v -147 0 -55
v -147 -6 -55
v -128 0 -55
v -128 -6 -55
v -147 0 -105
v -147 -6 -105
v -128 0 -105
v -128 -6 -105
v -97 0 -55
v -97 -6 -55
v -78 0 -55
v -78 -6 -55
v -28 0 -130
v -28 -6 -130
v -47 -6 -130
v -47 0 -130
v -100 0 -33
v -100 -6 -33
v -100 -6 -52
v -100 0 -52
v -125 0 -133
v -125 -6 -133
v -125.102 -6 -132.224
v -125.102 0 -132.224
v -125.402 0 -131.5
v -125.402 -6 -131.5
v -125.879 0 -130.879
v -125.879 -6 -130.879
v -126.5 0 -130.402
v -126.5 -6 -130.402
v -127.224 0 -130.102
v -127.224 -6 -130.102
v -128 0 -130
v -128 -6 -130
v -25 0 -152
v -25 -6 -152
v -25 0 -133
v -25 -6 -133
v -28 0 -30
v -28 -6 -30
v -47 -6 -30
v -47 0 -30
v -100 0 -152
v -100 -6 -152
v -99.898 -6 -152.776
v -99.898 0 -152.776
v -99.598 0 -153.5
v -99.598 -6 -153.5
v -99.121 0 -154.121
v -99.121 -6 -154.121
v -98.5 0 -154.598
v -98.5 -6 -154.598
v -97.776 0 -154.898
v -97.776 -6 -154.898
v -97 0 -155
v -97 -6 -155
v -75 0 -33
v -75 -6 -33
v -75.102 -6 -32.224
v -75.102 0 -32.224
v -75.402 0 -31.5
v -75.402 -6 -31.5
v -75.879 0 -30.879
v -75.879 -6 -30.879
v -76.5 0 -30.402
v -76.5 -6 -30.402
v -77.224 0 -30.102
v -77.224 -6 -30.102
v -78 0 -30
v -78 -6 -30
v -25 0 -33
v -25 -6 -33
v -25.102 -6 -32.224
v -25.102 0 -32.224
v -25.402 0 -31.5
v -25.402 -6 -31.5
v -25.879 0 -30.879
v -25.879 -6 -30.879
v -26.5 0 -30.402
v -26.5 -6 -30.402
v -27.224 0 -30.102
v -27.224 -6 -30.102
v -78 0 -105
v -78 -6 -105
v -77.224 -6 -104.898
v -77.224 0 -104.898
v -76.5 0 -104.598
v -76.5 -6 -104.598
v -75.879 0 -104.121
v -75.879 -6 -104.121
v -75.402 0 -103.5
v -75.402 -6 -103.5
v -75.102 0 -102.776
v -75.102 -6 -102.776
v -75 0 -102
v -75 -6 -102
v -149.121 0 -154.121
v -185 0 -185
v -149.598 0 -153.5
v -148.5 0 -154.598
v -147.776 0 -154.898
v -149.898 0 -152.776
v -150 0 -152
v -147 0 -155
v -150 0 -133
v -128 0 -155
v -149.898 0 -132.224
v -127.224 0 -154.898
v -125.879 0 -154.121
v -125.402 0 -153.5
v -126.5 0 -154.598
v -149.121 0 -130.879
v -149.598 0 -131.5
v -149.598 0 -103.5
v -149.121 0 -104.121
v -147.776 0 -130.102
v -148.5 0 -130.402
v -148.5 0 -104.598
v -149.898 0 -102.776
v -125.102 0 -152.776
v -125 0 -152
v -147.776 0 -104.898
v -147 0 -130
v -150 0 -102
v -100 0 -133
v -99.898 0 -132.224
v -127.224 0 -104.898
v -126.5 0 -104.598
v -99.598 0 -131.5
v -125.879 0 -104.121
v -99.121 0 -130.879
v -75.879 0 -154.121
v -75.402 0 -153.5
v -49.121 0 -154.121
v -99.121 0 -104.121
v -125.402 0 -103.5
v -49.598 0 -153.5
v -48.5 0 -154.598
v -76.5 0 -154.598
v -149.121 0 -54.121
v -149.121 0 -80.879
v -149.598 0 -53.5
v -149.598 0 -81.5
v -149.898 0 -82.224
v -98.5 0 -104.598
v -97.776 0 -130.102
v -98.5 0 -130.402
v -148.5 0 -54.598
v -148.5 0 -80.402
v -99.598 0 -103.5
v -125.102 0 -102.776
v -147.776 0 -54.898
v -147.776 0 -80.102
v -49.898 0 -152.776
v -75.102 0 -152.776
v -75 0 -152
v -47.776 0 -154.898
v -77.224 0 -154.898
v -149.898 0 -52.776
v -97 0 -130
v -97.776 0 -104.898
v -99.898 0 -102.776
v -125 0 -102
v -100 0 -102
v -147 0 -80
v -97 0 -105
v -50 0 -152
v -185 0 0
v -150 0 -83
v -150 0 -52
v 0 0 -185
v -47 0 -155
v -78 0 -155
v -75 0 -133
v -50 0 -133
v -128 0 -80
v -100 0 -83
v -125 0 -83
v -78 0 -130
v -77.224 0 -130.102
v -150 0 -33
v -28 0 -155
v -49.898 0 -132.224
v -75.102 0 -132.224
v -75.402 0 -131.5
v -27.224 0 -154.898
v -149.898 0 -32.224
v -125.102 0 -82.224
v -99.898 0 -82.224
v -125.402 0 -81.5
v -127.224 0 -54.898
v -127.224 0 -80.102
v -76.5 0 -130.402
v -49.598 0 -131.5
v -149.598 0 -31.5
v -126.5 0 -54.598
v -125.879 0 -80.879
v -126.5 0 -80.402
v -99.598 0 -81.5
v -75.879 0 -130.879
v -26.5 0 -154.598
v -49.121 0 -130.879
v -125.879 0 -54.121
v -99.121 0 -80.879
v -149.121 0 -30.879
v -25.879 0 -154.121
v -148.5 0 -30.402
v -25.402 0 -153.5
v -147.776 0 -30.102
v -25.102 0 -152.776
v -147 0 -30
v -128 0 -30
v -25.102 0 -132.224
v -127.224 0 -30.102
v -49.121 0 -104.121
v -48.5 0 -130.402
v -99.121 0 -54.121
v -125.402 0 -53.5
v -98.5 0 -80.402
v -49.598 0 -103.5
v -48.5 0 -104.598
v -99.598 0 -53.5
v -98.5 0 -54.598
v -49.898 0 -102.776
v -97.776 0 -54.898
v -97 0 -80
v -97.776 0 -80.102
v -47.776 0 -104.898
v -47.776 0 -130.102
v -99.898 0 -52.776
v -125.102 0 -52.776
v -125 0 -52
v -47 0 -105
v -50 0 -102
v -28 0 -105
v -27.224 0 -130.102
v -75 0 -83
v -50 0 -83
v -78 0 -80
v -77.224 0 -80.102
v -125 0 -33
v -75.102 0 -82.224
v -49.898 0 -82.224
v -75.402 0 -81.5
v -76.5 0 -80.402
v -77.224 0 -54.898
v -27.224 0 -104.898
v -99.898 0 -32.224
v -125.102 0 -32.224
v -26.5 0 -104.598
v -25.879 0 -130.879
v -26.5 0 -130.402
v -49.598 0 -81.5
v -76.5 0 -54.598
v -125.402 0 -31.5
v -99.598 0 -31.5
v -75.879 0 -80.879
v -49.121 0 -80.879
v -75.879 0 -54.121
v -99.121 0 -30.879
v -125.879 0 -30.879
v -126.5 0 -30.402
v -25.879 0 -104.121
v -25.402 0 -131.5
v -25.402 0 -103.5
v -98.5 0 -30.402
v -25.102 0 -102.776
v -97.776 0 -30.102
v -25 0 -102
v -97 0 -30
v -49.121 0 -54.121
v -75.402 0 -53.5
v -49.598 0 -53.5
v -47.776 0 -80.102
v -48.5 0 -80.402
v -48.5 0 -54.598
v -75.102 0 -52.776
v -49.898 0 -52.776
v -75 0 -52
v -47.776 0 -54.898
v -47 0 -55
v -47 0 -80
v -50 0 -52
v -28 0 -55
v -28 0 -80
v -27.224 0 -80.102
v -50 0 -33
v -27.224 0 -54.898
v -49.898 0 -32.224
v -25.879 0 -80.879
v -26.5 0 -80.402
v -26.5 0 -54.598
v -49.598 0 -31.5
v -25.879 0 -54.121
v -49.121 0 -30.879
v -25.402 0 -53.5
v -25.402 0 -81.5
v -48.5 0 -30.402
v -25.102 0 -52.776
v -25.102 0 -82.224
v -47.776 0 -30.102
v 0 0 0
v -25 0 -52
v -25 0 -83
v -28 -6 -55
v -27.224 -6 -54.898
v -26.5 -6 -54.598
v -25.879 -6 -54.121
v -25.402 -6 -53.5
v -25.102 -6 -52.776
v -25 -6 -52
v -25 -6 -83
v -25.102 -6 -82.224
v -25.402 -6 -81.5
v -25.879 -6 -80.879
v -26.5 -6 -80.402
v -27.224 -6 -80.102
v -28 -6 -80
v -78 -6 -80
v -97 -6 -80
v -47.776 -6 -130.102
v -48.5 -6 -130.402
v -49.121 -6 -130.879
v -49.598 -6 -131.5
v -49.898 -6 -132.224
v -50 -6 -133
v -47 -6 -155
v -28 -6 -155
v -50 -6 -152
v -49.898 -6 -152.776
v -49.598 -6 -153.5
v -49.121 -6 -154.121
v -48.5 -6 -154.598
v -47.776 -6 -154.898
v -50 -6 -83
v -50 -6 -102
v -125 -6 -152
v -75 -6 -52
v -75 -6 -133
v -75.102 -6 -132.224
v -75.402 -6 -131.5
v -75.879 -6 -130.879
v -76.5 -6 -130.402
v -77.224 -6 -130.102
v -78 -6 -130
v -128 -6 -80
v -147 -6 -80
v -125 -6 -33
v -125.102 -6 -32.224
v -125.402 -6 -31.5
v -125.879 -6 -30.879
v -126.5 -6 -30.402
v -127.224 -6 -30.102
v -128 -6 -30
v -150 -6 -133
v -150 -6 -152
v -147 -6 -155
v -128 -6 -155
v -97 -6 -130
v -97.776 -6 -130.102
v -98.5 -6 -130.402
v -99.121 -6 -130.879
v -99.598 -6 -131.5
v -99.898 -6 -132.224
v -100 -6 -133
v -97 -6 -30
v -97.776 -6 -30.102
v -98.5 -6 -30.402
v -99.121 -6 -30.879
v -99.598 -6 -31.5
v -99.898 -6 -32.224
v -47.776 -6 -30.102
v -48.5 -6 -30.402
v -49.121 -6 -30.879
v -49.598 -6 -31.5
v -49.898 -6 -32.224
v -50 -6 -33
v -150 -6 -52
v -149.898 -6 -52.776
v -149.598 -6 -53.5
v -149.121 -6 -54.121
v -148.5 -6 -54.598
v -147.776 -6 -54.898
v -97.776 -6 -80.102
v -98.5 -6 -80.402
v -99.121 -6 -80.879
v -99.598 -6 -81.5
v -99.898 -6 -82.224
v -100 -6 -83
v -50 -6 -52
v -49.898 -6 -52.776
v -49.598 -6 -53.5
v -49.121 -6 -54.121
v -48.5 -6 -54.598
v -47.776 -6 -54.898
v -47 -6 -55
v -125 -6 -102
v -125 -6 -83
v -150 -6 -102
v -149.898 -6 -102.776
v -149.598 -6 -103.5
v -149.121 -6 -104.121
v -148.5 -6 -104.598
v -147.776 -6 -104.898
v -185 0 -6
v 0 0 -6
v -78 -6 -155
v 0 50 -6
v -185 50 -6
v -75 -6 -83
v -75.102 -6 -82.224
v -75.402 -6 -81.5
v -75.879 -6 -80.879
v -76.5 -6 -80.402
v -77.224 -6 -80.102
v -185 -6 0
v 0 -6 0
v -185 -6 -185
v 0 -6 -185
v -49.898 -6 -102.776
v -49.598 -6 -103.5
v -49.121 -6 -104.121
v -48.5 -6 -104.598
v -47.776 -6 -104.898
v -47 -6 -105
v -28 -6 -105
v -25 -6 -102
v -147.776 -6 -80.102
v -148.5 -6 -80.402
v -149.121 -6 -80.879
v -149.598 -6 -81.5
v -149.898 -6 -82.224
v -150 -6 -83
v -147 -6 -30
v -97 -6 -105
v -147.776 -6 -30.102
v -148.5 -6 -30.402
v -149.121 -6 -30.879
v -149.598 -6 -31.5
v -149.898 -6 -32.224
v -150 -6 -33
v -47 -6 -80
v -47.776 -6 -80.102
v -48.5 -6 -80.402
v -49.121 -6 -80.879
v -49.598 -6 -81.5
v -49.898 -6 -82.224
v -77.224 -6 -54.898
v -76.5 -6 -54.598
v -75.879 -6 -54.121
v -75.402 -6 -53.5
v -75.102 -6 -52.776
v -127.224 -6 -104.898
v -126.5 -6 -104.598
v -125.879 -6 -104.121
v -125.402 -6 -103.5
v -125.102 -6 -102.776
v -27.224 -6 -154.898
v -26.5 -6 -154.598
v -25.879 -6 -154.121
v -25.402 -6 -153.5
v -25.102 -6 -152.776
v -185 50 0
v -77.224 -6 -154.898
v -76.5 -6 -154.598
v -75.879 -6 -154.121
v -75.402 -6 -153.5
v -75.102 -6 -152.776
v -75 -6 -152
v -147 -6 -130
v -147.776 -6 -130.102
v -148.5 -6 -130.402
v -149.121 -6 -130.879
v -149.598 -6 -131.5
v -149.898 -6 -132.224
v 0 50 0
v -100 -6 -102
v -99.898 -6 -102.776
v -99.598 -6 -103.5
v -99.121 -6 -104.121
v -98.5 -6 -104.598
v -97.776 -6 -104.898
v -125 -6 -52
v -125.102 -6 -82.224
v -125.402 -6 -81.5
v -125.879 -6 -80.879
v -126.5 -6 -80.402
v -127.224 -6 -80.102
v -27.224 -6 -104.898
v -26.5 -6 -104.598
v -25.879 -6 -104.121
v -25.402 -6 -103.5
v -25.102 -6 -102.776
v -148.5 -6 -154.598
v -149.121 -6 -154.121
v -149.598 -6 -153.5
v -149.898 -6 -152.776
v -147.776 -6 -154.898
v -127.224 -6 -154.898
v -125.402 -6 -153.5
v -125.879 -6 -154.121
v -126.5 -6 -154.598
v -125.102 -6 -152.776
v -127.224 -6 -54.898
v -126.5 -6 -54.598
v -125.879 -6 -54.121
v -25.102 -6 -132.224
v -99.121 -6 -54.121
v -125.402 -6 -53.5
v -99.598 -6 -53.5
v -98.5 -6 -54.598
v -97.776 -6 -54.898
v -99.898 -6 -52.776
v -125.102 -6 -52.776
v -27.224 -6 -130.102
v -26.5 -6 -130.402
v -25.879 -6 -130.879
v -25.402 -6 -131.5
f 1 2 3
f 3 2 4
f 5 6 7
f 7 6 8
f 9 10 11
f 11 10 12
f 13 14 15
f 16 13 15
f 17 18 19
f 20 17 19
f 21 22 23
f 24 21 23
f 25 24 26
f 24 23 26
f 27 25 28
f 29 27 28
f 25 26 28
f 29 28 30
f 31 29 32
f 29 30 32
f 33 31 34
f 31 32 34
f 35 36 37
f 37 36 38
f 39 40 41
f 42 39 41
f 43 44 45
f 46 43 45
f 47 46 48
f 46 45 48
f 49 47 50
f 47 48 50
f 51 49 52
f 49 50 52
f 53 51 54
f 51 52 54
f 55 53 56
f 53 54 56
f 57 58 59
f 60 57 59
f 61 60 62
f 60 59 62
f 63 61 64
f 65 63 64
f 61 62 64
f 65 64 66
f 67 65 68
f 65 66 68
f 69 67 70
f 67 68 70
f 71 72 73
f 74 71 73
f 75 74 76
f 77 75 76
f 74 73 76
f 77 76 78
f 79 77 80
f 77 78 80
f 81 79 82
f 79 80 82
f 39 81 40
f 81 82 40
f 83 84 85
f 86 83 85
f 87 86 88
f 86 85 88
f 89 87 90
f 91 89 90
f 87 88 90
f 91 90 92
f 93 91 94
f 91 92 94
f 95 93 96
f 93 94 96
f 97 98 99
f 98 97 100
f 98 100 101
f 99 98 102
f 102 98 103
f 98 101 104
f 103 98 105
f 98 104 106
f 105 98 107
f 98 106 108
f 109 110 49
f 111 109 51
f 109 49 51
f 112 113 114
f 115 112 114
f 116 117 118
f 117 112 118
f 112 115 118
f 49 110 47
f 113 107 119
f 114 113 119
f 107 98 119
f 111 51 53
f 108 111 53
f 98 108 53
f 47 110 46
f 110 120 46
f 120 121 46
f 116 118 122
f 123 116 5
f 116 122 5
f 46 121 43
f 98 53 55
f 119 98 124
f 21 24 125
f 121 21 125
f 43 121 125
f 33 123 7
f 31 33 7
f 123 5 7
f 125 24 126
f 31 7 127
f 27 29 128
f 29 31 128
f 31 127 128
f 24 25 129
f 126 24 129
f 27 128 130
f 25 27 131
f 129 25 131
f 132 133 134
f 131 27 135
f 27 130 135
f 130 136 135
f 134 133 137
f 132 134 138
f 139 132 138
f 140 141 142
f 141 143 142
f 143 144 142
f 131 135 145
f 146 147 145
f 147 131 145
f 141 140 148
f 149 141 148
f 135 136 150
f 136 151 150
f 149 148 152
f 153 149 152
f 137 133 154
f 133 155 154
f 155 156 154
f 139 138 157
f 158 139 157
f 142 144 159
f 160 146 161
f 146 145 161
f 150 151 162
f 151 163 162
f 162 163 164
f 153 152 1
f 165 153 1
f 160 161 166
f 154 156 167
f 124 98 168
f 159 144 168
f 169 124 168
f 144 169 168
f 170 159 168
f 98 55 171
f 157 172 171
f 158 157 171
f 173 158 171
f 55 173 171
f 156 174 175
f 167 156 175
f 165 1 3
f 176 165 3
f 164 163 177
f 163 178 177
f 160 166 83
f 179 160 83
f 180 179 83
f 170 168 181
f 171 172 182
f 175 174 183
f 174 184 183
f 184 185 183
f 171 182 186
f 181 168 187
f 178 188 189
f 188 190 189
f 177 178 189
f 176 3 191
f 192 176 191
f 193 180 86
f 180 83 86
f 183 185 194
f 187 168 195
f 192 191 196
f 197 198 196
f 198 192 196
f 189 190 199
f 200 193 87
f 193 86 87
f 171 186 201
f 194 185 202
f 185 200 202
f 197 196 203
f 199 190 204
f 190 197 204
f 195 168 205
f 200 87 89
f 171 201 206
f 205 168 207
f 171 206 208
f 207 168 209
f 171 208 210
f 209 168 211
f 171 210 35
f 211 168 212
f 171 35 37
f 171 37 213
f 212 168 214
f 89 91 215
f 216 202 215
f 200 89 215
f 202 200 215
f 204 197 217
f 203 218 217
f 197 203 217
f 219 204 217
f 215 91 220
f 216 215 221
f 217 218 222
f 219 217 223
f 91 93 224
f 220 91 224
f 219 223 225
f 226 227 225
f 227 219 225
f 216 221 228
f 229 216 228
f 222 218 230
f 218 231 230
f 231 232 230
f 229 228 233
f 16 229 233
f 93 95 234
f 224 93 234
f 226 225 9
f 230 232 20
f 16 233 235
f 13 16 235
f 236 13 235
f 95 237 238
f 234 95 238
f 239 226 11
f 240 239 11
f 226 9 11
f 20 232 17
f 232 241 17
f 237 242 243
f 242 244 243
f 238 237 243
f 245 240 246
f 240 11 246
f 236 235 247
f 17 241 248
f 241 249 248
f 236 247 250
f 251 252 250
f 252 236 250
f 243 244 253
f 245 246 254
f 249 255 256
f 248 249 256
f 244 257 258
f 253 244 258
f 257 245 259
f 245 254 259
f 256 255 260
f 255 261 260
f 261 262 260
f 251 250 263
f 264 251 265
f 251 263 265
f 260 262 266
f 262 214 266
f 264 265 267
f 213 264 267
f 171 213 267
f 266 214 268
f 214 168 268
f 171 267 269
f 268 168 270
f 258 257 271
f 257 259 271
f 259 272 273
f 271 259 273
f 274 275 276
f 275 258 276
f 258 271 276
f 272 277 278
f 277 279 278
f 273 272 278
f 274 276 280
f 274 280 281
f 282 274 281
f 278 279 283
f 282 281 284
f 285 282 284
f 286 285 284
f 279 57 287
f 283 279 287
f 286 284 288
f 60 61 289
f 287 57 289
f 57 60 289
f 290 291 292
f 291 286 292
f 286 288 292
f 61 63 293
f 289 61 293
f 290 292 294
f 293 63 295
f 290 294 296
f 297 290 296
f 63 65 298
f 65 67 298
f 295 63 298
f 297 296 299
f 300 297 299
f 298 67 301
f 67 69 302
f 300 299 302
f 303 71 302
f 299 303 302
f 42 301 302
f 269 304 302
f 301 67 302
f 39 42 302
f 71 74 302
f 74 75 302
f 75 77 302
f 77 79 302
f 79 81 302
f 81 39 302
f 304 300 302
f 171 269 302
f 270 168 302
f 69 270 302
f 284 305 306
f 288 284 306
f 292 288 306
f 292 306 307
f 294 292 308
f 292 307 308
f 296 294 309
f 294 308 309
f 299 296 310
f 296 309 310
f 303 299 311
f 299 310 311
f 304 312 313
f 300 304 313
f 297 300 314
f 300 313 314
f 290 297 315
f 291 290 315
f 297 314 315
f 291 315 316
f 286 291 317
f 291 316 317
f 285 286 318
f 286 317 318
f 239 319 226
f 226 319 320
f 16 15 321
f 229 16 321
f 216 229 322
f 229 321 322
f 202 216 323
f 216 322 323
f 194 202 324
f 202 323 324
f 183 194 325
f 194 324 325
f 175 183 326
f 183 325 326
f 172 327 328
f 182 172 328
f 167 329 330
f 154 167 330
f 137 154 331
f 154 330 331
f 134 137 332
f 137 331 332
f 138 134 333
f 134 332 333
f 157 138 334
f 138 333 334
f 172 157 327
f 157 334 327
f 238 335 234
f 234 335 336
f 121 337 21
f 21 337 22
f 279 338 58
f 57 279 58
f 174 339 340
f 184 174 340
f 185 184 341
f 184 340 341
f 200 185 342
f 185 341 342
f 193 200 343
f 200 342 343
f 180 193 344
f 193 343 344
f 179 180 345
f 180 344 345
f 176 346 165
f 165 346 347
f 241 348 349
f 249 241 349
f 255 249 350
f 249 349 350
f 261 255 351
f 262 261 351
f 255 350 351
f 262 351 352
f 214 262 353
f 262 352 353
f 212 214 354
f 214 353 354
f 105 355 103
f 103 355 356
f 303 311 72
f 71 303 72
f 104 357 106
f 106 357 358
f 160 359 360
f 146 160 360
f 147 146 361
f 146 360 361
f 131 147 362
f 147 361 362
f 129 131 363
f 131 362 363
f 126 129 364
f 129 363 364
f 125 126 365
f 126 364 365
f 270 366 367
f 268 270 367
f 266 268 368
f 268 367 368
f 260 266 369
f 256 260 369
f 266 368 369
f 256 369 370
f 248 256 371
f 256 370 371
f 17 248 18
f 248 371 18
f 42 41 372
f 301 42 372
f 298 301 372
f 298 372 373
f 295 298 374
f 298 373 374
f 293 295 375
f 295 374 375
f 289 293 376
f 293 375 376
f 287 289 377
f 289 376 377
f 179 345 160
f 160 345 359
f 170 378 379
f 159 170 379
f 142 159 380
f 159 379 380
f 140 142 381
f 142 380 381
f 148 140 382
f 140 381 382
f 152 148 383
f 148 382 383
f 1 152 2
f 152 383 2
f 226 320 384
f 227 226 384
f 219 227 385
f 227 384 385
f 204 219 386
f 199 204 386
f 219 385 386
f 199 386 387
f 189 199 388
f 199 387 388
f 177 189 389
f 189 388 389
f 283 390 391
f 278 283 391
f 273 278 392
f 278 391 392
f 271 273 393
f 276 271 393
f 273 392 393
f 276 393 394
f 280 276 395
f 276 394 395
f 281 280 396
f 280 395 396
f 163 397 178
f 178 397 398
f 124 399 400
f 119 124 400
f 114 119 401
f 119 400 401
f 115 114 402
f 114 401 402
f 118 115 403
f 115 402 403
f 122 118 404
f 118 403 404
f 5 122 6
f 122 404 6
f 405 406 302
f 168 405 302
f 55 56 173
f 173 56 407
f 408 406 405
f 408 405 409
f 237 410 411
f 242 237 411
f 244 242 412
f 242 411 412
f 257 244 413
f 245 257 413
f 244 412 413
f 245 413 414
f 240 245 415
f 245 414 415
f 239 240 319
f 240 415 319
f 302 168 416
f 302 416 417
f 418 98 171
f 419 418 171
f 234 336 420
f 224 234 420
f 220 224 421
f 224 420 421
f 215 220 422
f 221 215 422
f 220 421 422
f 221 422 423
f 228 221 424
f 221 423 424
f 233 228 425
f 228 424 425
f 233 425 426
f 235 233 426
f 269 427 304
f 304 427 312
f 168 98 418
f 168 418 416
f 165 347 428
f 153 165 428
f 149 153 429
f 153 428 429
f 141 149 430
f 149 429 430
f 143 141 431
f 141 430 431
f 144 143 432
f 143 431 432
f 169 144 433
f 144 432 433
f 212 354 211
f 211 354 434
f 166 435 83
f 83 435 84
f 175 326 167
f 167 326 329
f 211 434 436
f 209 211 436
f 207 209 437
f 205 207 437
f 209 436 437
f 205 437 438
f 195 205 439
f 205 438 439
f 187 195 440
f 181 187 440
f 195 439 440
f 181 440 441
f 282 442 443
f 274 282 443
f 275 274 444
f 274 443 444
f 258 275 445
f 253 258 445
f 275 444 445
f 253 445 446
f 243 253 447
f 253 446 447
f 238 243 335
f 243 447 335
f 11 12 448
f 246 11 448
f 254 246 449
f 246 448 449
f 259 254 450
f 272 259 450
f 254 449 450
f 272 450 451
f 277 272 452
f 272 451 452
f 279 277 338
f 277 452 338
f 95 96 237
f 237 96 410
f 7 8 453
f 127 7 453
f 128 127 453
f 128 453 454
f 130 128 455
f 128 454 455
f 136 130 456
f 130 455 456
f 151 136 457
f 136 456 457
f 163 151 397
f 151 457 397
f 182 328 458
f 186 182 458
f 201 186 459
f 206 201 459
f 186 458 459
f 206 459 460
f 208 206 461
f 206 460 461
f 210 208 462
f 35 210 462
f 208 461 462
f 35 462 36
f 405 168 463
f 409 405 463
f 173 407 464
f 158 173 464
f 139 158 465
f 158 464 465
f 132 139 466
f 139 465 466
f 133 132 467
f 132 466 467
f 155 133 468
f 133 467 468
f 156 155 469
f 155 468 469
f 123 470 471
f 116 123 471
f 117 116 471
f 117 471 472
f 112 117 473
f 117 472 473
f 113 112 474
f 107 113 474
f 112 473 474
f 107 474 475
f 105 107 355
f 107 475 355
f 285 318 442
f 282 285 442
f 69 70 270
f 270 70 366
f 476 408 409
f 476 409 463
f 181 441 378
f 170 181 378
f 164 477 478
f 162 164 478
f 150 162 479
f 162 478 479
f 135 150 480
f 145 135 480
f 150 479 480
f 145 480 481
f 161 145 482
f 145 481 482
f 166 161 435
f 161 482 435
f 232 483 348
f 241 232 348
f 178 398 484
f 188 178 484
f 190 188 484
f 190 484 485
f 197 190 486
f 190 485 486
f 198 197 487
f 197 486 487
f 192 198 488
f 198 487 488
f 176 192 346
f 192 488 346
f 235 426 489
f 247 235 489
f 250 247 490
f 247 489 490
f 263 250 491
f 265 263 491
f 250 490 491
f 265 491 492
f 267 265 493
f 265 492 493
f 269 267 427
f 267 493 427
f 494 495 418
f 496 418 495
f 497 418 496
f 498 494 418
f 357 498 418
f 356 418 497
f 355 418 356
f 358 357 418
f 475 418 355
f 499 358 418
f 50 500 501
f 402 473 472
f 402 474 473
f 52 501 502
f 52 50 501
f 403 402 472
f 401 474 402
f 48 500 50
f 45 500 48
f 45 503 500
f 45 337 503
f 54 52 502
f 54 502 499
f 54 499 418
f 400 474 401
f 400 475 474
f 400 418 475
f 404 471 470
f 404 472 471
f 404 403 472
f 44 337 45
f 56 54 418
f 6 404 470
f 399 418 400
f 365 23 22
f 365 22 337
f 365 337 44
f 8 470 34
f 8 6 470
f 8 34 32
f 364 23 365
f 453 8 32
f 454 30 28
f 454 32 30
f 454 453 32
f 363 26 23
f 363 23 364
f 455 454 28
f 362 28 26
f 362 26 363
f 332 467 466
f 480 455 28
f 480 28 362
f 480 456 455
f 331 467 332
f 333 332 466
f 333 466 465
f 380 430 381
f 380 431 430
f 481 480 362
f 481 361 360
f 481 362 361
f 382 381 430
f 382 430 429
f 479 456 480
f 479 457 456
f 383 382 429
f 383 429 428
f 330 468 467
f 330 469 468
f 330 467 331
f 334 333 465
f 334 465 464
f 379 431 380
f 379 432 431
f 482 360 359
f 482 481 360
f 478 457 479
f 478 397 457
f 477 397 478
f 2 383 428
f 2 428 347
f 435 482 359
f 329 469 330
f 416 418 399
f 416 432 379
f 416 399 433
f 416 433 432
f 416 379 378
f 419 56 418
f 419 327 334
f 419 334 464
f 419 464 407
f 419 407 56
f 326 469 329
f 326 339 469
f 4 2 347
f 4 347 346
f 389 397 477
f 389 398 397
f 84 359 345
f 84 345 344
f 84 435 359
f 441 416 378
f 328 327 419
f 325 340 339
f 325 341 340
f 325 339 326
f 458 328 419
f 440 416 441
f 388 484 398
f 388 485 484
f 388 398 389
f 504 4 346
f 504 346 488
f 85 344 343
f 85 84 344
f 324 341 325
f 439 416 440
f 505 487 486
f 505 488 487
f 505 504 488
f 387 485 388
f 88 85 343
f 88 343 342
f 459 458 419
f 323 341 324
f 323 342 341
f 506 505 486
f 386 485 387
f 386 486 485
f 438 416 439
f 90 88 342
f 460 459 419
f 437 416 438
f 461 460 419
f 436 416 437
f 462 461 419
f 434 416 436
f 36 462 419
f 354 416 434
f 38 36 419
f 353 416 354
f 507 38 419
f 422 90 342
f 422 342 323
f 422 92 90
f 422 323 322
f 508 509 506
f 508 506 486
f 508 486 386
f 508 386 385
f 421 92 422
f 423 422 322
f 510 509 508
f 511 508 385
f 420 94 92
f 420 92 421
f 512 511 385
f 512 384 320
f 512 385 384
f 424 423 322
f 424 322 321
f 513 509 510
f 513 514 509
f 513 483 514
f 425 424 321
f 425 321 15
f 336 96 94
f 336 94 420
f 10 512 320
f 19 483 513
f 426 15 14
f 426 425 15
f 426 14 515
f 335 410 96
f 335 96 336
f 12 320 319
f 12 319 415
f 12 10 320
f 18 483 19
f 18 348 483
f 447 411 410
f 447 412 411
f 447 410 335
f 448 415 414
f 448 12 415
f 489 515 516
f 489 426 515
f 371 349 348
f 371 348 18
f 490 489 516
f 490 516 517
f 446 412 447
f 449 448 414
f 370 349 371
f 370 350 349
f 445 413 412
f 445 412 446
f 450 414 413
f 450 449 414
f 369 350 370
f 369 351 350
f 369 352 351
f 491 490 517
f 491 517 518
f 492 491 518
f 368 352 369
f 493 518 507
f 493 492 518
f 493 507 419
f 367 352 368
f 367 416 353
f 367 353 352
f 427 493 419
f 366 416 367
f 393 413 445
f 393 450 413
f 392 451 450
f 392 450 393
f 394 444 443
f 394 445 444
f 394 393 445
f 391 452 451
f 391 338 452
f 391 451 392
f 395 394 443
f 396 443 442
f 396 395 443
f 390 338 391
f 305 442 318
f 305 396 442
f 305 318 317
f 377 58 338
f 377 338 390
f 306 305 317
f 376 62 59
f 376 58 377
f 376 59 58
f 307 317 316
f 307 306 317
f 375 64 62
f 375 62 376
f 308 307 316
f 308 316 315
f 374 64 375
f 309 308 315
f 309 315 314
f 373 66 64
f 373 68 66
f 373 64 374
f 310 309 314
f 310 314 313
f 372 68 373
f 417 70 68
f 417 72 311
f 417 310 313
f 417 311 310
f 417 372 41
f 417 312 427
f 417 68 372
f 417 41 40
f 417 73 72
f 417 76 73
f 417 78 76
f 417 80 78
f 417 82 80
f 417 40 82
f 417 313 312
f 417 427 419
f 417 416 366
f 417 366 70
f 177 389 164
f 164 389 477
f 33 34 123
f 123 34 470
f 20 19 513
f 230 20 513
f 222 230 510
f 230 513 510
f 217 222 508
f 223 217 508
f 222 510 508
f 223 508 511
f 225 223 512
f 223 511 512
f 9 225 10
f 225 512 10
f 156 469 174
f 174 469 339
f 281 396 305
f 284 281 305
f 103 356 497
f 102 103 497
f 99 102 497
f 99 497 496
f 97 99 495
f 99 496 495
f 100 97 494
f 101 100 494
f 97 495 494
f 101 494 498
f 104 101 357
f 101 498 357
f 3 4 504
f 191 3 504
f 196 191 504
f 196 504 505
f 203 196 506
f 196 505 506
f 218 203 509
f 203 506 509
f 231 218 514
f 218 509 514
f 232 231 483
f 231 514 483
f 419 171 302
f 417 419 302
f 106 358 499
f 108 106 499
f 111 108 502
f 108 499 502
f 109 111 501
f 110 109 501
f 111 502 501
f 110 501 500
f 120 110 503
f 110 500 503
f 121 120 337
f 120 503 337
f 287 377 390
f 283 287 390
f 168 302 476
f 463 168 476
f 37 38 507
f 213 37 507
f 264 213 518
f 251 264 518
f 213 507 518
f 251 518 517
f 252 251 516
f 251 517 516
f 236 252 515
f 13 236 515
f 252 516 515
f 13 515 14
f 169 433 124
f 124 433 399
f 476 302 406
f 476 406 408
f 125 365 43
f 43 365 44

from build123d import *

# Parameters (mm, degrees)
F0_W     = 185
F0_H     = 185
F1_DEPTH = 6
F3_DEPTH = 25
F4_W     = 50
F4_H     = 6
F5_DEPTH = 185


with BuildPart() as f1:
    # F0 (on Front) → F1 (new body)
    with BuildSketch(Plane.XZ):
        with Locations((-92.5, -92.5)):
            Rectangle(F0_W, F0_H)
    extrude(amount=F1_DEPTH)

    # F2 (on face) → F3 (cut)
    with BuildSketch(Plane.XZ.offset(6)):
        with BuildLine():
            ThreePointArc((-125, -33), (-125.87868, -30.87868), (-128, -30))
            Line((-128, -30), (-147, -30))
            ThreePointArc((-147, -30), (-149.12132, -30.87868), (-150, -33))
            Line((-150, -33), (-150, -52))
            ThreePointArc((-150, -52), (-149.12132, -54.12132), (-147, -55))
            Line((-147, -55), (-128, -55))
            ThreePointArc((-128, -55), (-125.87868, -54.12132), (-125, -52))
            Line((-125, -52), (-125, -33))
        make_face()
        with BuildLine():
            ThreePointArc((-75, -33), (-75.87868, -30.87868), (-78, -30))
            Line((-78, -30), (-97, -30))
            ThreePointArc((-97, -30), (-99.12132, -30.87868), (-100, -33))
            Line((-100, -33), (-100, -52))
            ThreePointArc((-100, -52), (-99.12132, -54.12132), (-97, -55))
            Line((-97, -55), (-78, -55))
            ThreePointArc((-78, -55), (-75.87868, -54.12132), (-75, -52))
            Line((-75, -52), (-75, -33))
        make_face()
        with BuildLine():
            Line((-25, -52), (-25, -33))
            ThreePointArc((-25, -33), (-25.87868, -30.87868), (-28, -30))
            Line((-28, -30), (-47, -30))
            ThreePointArc((-47, -30), (-49.12132, -30.87868), (-50, -33))
            Line((-50, -33), (-50, -52))
            ThreePointArc((-50, -52), (-49.12132, -54.12132), (-47, -55))
            Line((-47, -55), (-28, -55))
            ThreePointArc((-28, -55), (-25.87868, -54.12132), (-25, -52))
        make_face()
        with BuildLine():
            Line((-25, -102), (-25, -83))
            ThreePointArc((-25, -83), (-25.87868, -80.87868), (-28, -80))
            Line((-28, -80), (-47, -80))
            ThreePointArc((-47, -80), (-49.12132, -80.87868), (-50, -83))
            Line((-50, -83), (-50, -102))
            ThreePointArc((-50, -102), (-49.12132, -104.12132), (-47, -105))
            Line((-47, -105), (-28, -105))
            ThreePointArc((-28, -105), (-25.87868, -104.12132), (-25, -102))
        make_face()
        with BuildLine():
            Line((-97, -105), (-78, -105))
            ThreePointArc((-78, -105), (-75.87868, -104.12132), (-75, -102))
            Line((-75, -102), (-75, -83))
            ThreePointArc((-75, -83), (-75.87868, -80.87868), (-78, -80))
            Line((-78, -80), (-97, -80))
            ThreePointArc((-97, -80), (-99.12132, -80.87868), (-100, -83))
            Line((-100, -83), (-100, -102))
            ThreePointArc((-100, -102), (-99.12132, -104.12132), (-97, -105))
        make_face()
        with BuildLine():
            Line((-147, -105), (-128, -105))
            ThreePointArc((-128, -105), (-125.87868, -104.12132), (-125, -102))
            Line((-125, -102), (-125, -83))
            ThreePointArc((-125, -83), (-125.87868, -80.87868), (-128, -80))
            Line((-128, -80), (-147, -80))
            ThreePointArc((-147, -80), (-149.12132, -80.87868), (-150, -83))
            Line((-150, -83), (-150, -102))
            ThreePointArc((-150, -102), (-149.12132, -104.12132), (-147, -105))
        make_face()
        with BuildLine():
            ThreePointArc((-150, -152), (-149.12132, -154.12132), (-147, -155))
            Line((-147, -155), (-128, -155))
            ThreePointArc((-128, -155), (-125.87868, -154.12132), (-125, -152))
            Line((-125, -152), (-125, -133))
            ThreePointArc((-125, -133), (-125.87868, -130.87868), (-128, -130))
            Line((-128, -130), (-147, -130))
            ThreePointArc((-147, -130), (-149.12132, -130.87868), (-150, -133))
            Line((-150, -133), (-150, -152))
        make_face()
        with BuildLine():
            ThreePointArc((-100, -152), (-99.12132, -154.12132), (-97, -155))
            Line((-97, -155), (-78, -155))
            ThreePointArc((-78, -155), (-75.87868, -154.12132), (-75, -152))
            Line((-75, -152), (-75, -133))
            ThreePointArc((-75, -133), (-75.87868, -130.87868), (-78, -130))
            Line((-78, -130), (-97, -130))
            ThreePointArc((-97, -130), (-99.12132, -130.87868), (-100, -133))
            Line((-100, -133), (-100, -152))
        make_face()
        with BuildLine():
            Line((-25, -152), (-25, -133))
            ThreePointArc((-25, -133), (-25.87868, -130.87868), (-28, -130))
            Line((-28, -130), (-47, -130))
            ThreePointArc((-47, -130), (-49.12132, -130.87868), (-50, -133))
            Line((-50, -133), (-50, -152))
            ThreePointArc((-50, -152), (-49.12132, -154.12132), (-47, -155))
            Line((-47, -155), (-28, -155))
            ThreePointArc((-28, -155), (-25.87868, -154.12132), (-25, -152))
        make_face()
    extrude(amount=-F3_DEPTH, mode=Mode.SUBTRACT)


with BuildPart() as f5:
    # F4 (on Right) → F5 (new body)
    with BuildSketch(Plane.YZ):
        with Locations((25, -3)):
            Rectangle(F4_W, F4_H)
    extrude(amount=-F5_DEPTH)


solid = Compound([f1.part, f5.part])
